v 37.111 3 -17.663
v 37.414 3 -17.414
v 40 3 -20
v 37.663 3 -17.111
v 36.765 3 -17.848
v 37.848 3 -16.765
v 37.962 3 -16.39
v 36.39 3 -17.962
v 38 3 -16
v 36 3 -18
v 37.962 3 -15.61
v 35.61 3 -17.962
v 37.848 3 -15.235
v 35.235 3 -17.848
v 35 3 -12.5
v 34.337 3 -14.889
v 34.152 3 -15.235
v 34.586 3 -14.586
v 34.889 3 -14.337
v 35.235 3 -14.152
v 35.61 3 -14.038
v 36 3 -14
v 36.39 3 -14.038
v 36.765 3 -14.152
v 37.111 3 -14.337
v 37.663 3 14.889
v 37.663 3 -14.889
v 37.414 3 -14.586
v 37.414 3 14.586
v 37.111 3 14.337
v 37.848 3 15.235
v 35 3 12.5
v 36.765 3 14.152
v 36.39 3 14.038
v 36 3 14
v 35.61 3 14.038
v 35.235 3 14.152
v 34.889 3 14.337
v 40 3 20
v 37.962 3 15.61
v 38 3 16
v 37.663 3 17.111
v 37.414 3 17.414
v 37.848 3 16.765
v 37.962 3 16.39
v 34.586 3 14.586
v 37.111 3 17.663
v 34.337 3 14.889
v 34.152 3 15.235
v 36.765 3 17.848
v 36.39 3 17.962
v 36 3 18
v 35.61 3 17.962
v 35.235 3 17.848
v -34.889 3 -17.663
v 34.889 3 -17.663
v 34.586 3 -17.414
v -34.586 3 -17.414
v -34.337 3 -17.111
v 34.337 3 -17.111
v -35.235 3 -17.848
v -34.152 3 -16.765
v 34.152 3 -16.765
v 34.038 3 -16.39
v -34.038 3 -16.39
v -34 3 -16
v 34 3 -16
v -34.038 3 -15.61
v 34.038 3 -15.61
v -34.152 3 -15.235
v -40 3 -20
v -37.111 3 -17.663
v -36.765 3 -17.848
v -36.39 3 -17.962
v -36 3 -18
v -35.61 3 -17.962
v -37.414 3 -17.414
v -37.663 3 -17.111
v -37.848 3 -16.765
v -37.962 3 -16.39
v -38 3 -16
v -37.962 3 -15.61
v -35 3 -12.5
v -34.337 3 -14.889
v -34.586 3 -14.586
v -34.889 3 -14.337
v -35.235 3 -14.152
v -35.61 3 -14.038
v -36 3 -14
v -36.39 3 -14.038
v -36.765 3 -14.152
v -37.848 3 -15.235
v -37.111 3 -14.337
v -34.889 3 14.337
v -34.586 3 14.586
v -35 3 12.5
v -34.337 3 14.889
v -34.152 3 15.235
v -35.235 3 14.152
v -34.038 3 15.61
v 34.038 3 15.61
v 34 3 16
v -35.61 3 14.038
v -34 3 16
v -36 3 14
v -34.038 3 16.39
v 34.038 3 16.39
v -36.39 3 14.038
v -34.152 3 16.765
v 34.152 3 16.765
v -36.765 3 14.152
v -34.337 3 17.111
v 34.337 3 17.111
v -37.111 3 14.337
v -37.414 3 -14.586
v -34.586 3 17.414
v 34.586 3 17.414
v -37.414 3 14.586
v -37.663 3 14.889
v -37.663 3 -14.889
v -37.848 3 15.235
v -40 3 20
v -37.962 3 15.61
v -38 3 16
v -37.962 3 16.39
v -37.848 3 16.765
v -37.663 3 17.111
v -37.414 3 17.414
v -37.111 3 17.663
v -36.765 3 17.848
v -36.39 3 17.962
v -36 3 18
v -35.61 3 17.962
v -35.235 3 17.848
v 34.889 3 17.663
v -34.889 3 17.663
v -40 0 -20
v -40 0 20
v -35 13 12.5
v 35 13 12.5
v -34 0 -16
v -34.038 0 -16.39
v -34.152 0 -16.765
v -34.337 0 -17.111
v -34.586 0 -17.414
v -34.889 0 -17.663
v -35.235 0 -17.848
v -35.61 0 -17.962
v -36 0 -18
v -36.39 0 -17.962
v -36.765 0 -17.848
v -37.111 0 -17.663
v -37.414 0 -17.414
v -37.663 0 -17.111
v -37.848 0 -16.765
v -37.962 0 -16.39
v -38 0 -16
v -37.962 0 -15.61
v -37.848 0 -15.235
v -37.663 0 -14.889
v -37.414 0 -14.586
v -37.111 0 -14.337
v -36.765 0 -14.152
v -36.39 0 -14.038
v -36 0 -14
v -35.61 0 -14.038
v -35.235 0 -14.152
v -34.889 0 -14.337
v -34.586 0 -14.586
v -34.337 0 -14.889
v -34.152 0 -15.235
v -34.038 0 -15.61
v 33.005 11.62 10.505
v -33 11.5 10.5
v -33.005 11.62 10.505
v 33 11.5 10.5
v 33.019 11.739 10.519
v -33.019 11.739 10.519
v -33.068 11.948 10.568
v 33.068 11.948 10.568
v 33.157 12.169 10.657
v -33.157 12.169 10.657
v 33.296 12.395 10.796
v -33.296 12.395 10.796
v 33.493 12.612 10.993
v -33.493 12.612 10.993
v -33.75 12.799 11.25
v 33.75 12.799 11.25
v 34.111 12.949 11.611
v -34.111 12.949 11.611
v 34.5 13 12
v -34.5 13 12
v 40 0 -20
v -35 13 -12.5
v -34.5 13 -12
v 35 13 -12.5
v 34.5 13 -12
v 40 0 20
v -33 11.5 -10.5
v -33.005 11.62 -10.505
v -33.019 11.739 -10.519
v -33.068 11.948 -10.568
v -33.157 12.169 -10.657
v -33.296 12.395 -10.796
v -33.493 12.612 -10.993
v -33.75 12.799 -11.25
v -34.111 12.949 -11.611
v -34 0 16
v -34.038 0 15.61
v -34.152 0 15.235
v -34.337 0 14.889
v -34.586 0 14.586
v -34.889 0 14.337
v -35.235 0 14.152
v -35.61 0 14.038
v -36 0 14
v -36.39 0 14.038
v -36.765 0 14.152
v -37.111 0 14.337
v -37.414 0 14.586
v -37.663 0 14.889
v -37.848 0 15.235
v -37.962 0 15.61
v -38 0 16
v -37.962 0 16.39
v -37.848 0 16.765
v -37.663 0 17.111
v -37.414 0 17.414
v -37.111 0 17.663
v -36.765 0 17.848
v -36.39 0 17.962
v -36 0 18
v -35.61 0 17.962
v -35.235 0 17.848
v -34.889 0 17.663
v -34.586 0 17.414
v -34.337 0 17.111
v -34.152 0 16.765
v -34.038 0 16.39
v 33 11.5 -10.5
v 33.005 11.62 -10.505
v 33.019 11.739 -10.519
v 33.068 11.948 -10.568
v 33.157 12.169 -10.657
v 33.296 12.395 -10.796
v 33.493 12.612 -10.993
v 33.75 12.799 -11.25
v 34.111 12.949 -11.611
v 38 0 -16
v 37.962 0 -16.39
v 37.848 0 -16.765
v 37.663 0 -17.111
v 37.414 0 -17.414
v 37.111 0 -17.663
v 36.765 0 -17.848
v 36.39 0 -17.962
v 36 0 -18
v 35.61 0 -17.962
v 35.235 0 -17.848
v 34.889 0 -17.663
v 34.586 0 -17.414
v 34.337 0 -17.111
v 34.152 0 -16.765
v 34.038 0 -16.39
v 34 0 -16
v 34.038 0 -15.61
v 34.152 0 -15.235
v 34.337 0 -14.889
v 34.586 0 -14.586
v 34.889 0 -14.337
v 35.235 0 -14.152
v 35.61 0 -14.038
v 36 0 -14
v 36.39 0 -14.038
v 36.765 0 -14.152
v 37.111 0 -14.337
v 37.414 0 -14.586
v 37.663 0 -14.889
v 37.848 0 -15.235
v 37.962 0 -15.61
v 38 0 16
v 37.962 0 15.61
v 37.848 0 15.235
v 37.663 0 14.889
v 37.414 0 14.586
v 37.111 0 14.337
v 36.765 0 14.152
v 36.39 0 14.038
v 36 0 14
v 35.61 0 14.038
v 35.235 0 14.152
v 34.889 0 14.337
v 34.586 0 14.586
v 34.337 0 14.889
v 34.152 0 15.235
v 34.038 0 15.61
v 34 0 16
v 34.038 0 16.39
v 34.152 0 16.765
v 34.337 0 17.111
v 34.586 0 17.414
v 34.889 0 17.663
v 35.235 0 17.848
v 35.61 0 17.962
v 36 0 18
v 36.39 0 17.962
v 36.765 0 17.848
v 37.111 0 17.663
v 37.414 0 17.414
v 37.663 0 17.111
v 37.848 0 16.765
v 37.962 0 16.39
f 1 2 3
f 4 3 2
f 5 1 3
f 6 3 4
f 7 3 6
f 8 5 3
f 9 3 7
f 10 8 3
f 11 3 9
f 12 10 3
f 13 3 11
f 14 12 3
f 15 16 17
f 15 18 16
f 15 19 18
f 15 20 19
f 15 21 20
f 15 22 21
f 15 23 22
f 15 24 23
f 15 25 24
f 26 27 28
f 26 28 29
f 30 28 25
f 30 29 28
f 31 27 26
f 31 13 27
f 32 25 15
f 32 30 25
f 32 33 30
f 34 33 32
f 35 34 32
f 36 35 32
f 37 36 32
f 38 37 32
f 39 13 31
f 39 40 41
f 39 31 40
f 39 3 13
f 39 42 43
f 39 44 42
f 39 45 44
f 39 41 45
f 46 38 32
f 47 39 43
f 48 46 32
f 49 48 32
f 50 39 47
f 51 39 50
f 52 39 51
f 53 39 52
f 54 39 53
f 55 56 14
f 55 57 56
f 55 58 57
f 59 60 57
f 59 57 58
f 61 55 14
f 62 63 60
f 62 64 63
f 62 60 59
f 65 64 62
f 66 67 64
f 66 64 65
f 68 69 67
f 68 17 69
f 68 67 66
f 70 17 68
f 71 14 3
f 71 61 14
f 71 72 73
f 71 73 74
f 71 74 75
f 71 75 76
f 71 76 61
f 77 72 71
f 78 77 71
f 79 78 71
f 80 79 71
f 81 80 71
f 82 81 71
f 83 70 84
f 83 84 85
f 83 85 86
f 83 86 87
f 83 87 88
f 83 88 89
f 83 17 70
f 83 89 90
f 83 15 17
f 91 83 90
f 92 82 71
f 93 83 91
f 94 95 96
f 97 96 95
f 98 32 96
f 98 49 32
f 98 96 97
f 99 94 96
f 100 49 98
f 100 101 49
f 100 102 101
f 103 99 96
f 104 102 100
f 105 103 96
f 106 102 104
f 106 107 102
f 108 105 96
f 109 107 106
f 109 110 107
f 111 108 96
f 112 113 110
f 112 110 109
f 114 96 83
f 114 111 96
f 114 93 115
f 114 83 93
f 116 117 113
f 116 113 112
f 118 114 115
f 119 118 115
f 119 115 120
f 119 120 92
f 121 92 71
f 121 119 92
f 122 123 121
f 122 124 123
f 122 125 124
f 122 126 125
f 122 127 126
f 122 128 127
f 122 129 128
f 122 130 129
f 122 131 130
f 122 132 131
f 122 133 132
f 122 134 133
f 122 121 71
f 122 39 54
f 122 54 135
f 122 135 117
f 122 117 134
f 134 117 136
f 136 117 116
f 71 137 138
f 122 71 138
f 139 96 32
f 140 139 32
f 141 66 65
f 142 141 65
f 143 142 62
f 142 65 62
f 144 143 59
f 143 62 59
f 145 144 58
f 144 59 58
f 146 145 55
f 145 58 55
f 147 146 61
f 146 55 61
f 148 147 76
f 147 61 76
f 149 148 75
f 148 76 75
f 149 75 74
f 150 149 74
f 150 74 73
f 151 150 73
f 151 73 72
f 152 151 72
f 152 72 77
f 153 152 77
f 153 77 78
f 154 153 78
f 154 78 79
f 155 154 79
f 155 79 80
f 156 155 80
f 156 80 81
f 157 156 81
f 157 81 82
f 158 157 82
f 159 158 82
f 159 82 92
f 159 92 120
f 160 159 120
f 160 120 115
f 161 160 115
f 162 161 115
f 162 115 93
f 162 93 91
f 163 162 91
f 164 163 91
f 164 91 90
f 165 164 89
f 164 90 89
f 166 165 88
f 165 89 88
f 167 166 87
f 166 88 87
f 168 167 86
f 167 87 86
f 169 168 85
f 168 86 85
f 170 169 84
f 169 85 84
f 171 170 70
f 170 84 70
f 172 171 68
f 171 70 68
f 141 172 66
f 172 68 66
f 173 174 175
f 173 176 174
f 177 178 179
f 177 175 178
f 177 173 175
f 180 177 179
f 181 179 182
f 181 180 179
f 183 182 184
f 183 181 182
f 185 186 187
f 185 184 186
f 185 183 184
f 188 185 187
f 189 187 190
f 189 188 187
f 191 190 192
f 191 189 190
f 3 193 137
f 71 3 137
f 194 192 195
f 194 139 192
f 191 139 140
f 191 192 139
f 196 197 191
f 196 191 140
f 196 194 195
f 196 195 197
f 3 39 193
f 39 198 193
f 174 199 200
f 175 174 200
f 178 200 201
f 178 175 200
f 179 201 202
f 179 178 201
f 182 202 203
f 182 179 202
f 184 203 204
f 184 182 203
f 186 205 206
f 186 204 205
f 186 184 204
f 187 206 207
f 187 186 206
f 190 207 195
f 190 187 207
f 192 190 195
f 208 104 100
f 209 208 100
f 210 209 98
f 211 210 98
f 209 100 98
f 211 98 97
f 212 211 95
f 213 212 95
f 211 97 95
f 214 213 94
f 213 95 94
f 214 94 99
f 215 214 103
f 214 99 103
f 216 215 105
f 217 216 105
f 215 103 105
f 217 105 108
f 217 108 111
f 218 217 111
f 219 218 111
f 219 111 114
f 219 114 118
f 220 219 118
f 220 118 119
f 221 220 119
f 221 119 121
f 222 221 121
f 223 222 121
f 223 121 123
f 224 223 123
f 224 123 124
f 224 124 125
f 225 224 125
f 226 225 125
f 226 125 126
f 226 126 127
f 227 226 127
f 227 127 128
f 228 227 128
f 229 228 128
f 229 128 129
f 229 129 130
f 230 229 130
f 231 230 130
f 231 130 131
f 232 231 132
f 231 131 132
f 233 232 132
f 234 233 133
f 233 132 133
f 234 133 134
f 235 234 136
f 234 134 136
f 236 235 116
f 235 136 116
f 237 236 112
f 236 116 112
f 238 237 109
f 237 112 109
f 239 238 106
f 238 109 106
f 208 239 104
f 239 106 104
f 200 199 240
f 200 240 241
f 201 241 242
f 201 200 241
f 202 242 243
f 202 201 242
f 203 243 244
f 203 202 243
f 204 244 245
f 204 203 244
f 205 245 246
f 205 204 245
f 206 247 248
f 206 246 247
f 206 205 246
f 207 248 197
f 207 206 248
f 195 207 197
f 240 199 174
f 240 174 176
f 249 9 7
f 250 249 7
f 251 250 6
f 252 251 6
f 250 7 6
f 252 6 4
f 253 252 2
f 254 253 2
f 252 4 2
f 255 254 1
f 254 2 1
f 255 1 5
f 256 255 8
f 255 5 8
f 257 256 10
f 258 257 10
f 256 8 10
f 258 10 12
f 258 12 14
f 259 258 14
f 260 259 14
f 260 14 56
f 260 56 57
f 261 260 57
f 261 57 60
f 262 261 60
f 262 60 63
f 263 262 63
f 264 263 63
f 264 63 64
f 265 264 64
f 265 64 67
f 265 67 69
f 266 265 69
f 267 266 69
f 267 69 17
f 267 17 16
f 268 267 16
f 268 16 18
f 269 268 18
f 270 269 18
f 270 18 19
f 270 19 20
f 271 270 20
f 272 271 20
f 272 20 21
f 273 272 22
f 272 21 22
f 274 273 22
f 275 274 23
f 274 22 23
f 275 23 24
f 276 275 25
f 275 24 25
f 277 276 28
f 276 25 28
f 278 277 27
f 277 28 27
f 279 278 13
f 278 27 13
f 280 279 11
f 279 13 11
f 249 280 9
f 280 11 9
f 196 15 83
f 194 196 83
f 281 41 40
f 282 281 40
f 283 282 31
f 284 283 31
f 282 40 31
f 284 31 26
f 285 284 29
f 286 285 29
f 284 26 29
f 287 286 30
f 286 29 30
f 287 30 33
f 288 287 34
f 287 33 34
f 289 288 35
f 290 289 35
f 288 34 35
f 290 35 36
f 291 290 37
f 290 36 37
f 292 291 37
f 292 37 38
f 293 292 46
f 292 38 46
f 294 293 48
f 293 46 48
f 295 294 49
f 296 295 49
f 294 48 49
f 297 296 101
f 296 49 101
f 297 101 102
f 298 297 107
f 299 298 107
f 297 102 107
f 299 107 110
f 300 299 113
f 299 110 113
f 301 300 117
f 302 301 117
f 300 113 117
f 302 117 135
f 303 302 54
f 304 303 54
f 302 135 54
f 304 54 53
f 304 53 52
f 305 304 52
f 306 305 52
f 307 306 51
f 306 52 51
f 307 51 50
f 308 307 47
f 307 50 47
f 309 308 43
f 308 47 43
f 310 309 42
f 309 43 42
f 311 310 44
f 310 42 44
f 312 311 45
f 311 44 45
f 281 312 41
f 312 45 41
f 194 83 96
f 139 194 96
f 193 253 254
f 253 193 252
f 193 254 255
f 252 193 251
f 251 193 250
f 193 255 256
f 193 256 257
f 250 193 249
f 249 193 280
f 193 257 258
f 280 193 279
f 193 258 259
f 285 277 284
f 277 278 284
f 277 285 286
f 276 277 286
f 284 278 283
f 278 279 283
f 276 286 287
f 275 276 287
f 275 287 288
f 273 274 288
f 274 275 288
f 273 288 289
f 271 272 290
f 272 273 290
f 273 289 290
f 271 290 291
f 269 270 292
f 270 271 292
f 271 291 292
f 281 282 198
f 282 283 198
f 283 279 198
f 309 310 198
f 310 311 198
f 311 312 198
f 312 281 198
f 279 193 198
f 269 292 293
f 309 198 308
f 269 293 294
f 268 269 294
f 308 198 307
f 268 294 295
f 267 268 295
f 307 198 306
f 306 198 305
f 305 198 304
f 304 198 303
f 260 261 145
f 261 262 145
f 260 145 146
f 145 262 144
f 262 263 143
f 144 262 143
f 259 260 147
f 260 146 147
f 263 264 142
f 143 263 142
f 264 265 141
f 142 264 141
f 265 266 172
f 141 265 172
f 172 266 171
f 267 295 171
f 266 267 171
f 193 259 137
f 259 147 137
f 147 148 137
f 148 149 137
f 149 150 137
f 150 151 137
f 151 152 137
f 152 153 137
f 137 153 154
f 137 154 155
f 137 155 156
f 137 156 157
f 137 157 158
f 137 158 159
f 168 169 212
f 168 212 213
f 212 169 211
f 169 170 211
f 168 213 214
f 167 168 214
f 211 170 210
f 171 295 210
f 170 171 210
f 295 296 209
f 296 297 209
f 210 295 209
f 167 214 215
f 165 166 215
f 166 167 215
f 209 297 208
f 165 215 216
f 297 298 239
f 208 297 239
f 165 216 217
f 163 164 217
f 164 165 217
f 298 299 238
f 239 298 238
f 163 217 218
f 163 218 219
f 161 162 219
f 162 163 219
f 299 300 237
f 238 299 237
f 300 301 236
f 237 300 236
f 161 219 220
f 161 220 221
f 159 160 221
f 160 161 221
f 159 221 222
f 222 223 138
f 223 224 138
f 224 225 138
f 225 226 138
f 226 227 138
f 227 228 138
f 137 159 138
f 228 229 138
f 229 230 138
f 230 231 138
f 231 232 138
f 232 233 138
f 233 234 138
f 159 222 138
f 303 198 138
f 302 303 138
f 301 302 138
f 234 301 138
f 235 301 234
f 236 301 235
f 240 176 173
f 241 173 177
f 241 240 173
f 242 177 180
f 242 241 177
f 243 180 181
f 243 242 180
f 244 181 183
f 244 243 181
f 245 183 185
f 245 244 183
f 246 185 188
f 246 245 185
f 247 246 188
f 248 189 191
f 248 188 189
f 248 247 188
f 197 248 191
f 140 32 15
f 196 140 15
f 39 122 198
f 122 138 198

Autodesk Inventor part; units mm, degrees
ref_plane "YZ Plane" through (0, 0, 0) normal (1, 0, 0) x (0, 1, 0)
ref_plane "XZ Plane" through (0, 0, 0) normal (0, 1, 0) x (-1, 0, 0)
ref_plane "XY Plane" through (0, 0, 0) normal (0, 0, 1) x (1, 0, 0)
sketch "Sketch1" plane through (0, 0, 0) normal (0, 1, 0) x (-1, 0, 0)
  line L0 (40, 20) -> (-40, 20)
  line L1 (-40, 20) -> (-40, -20)
  line L2 (-40, -20) -> (40, -20)
  line L3 (40, -20) -> (40, 20)
  line L4 (40, 20) -> (-40, -20) construction
  line L5 (-40, 20) -> (40, -20) construction
  point P0 (0, 0)
  dimension "d0" = 80
  dimension "d1" = 40
extrude "Extrusion1" add sketch "Sketch1" along normal blind 3
sketch "Sketch2" plane through (0, 3, 0) normal (0, 1, 0) x (1, 0, 0)
  line L0 (-35, -12.5) -> (35, -12.5)
  line L1 (35, -12.5) -> (35, 12.5)
  line L2 (35, 12.5) -> (-35, 12.5)
  line L3 (-35, 12.5) -> (-35, -12.5)
  line L4 (-35, -12.5) -> (35, 12.5) construction
  line L5 (35, -12.5) -> (-35, 12.5) construction
  point P0 (0, 0)
  dimension "d4" = 70
  dimension "d5" = 25
extrude "Extrusion2" add sketch "Sketch2" along normal blind 10
sketch "Sketch3" plane through (0, 13, 0) normal (0, 1, 0) x (1, 0, 0)
  line L0 (33, 10.5) -> (-33, 10.5)
  line L1 (-33, 10.5) -> (-33, -10.5)
  line L2 (-33, -10.5) -> (33, -10.5)
  line L3 (33, -10.5) -> (33, 10.5)
  line L4 (33, 10.5) -> (-33, -10.5) construction
  line L5 (-33, 10.5) -> (33, -10.5) construction
  point P0 (0, 0)
  dimension "d8" = 66
  dimension "d9" = 21
extrude "Extrusion3" cut sketch "Sketch3" against normal blind 1.5
fillet "Fillet1" radius 1.5 4 edges at (0, 13, -10.5) (-33, 13, 0) (0, 13, 10.5) (33, 13, 0)
sketch "Sketch4" plane through (0, 3, 0) normal (0, 1, 0) x (1, 0, 0)
  line L0 (-40, 20) -> (-40, 16)
  line L1 (-40, 20) -> (-40, -20) projected
  line L2 (-40, 16) -> (-36, 16)
  circle A0 centre (-36, 16) radius 2
  line L3 (-40, 0) -> (40, 0)
  line L4 (40, -20) -> (40, 20) projected
  line L5 (40, 20) -> (-40, 20) projected
  line L6 (0, 20) -> (0, -20)
  line L7 (-40, -20) -> (40, -20) projected
  circle A1 centre (-36, -16) radius 2
  circle A2 centre (36, 16) radius 2
  circle A3 centre (36, -16) radius 2
  point P0 (0, 0)
  dimension "d13" = 4
  dimension "d14" = 4
  dimension "d15" = 4
extrude "Extrusion4" cut sketch "Sketch4" against normal blind 3 contours A0 | A1 | A2 | A3
properties part number "LCD"
